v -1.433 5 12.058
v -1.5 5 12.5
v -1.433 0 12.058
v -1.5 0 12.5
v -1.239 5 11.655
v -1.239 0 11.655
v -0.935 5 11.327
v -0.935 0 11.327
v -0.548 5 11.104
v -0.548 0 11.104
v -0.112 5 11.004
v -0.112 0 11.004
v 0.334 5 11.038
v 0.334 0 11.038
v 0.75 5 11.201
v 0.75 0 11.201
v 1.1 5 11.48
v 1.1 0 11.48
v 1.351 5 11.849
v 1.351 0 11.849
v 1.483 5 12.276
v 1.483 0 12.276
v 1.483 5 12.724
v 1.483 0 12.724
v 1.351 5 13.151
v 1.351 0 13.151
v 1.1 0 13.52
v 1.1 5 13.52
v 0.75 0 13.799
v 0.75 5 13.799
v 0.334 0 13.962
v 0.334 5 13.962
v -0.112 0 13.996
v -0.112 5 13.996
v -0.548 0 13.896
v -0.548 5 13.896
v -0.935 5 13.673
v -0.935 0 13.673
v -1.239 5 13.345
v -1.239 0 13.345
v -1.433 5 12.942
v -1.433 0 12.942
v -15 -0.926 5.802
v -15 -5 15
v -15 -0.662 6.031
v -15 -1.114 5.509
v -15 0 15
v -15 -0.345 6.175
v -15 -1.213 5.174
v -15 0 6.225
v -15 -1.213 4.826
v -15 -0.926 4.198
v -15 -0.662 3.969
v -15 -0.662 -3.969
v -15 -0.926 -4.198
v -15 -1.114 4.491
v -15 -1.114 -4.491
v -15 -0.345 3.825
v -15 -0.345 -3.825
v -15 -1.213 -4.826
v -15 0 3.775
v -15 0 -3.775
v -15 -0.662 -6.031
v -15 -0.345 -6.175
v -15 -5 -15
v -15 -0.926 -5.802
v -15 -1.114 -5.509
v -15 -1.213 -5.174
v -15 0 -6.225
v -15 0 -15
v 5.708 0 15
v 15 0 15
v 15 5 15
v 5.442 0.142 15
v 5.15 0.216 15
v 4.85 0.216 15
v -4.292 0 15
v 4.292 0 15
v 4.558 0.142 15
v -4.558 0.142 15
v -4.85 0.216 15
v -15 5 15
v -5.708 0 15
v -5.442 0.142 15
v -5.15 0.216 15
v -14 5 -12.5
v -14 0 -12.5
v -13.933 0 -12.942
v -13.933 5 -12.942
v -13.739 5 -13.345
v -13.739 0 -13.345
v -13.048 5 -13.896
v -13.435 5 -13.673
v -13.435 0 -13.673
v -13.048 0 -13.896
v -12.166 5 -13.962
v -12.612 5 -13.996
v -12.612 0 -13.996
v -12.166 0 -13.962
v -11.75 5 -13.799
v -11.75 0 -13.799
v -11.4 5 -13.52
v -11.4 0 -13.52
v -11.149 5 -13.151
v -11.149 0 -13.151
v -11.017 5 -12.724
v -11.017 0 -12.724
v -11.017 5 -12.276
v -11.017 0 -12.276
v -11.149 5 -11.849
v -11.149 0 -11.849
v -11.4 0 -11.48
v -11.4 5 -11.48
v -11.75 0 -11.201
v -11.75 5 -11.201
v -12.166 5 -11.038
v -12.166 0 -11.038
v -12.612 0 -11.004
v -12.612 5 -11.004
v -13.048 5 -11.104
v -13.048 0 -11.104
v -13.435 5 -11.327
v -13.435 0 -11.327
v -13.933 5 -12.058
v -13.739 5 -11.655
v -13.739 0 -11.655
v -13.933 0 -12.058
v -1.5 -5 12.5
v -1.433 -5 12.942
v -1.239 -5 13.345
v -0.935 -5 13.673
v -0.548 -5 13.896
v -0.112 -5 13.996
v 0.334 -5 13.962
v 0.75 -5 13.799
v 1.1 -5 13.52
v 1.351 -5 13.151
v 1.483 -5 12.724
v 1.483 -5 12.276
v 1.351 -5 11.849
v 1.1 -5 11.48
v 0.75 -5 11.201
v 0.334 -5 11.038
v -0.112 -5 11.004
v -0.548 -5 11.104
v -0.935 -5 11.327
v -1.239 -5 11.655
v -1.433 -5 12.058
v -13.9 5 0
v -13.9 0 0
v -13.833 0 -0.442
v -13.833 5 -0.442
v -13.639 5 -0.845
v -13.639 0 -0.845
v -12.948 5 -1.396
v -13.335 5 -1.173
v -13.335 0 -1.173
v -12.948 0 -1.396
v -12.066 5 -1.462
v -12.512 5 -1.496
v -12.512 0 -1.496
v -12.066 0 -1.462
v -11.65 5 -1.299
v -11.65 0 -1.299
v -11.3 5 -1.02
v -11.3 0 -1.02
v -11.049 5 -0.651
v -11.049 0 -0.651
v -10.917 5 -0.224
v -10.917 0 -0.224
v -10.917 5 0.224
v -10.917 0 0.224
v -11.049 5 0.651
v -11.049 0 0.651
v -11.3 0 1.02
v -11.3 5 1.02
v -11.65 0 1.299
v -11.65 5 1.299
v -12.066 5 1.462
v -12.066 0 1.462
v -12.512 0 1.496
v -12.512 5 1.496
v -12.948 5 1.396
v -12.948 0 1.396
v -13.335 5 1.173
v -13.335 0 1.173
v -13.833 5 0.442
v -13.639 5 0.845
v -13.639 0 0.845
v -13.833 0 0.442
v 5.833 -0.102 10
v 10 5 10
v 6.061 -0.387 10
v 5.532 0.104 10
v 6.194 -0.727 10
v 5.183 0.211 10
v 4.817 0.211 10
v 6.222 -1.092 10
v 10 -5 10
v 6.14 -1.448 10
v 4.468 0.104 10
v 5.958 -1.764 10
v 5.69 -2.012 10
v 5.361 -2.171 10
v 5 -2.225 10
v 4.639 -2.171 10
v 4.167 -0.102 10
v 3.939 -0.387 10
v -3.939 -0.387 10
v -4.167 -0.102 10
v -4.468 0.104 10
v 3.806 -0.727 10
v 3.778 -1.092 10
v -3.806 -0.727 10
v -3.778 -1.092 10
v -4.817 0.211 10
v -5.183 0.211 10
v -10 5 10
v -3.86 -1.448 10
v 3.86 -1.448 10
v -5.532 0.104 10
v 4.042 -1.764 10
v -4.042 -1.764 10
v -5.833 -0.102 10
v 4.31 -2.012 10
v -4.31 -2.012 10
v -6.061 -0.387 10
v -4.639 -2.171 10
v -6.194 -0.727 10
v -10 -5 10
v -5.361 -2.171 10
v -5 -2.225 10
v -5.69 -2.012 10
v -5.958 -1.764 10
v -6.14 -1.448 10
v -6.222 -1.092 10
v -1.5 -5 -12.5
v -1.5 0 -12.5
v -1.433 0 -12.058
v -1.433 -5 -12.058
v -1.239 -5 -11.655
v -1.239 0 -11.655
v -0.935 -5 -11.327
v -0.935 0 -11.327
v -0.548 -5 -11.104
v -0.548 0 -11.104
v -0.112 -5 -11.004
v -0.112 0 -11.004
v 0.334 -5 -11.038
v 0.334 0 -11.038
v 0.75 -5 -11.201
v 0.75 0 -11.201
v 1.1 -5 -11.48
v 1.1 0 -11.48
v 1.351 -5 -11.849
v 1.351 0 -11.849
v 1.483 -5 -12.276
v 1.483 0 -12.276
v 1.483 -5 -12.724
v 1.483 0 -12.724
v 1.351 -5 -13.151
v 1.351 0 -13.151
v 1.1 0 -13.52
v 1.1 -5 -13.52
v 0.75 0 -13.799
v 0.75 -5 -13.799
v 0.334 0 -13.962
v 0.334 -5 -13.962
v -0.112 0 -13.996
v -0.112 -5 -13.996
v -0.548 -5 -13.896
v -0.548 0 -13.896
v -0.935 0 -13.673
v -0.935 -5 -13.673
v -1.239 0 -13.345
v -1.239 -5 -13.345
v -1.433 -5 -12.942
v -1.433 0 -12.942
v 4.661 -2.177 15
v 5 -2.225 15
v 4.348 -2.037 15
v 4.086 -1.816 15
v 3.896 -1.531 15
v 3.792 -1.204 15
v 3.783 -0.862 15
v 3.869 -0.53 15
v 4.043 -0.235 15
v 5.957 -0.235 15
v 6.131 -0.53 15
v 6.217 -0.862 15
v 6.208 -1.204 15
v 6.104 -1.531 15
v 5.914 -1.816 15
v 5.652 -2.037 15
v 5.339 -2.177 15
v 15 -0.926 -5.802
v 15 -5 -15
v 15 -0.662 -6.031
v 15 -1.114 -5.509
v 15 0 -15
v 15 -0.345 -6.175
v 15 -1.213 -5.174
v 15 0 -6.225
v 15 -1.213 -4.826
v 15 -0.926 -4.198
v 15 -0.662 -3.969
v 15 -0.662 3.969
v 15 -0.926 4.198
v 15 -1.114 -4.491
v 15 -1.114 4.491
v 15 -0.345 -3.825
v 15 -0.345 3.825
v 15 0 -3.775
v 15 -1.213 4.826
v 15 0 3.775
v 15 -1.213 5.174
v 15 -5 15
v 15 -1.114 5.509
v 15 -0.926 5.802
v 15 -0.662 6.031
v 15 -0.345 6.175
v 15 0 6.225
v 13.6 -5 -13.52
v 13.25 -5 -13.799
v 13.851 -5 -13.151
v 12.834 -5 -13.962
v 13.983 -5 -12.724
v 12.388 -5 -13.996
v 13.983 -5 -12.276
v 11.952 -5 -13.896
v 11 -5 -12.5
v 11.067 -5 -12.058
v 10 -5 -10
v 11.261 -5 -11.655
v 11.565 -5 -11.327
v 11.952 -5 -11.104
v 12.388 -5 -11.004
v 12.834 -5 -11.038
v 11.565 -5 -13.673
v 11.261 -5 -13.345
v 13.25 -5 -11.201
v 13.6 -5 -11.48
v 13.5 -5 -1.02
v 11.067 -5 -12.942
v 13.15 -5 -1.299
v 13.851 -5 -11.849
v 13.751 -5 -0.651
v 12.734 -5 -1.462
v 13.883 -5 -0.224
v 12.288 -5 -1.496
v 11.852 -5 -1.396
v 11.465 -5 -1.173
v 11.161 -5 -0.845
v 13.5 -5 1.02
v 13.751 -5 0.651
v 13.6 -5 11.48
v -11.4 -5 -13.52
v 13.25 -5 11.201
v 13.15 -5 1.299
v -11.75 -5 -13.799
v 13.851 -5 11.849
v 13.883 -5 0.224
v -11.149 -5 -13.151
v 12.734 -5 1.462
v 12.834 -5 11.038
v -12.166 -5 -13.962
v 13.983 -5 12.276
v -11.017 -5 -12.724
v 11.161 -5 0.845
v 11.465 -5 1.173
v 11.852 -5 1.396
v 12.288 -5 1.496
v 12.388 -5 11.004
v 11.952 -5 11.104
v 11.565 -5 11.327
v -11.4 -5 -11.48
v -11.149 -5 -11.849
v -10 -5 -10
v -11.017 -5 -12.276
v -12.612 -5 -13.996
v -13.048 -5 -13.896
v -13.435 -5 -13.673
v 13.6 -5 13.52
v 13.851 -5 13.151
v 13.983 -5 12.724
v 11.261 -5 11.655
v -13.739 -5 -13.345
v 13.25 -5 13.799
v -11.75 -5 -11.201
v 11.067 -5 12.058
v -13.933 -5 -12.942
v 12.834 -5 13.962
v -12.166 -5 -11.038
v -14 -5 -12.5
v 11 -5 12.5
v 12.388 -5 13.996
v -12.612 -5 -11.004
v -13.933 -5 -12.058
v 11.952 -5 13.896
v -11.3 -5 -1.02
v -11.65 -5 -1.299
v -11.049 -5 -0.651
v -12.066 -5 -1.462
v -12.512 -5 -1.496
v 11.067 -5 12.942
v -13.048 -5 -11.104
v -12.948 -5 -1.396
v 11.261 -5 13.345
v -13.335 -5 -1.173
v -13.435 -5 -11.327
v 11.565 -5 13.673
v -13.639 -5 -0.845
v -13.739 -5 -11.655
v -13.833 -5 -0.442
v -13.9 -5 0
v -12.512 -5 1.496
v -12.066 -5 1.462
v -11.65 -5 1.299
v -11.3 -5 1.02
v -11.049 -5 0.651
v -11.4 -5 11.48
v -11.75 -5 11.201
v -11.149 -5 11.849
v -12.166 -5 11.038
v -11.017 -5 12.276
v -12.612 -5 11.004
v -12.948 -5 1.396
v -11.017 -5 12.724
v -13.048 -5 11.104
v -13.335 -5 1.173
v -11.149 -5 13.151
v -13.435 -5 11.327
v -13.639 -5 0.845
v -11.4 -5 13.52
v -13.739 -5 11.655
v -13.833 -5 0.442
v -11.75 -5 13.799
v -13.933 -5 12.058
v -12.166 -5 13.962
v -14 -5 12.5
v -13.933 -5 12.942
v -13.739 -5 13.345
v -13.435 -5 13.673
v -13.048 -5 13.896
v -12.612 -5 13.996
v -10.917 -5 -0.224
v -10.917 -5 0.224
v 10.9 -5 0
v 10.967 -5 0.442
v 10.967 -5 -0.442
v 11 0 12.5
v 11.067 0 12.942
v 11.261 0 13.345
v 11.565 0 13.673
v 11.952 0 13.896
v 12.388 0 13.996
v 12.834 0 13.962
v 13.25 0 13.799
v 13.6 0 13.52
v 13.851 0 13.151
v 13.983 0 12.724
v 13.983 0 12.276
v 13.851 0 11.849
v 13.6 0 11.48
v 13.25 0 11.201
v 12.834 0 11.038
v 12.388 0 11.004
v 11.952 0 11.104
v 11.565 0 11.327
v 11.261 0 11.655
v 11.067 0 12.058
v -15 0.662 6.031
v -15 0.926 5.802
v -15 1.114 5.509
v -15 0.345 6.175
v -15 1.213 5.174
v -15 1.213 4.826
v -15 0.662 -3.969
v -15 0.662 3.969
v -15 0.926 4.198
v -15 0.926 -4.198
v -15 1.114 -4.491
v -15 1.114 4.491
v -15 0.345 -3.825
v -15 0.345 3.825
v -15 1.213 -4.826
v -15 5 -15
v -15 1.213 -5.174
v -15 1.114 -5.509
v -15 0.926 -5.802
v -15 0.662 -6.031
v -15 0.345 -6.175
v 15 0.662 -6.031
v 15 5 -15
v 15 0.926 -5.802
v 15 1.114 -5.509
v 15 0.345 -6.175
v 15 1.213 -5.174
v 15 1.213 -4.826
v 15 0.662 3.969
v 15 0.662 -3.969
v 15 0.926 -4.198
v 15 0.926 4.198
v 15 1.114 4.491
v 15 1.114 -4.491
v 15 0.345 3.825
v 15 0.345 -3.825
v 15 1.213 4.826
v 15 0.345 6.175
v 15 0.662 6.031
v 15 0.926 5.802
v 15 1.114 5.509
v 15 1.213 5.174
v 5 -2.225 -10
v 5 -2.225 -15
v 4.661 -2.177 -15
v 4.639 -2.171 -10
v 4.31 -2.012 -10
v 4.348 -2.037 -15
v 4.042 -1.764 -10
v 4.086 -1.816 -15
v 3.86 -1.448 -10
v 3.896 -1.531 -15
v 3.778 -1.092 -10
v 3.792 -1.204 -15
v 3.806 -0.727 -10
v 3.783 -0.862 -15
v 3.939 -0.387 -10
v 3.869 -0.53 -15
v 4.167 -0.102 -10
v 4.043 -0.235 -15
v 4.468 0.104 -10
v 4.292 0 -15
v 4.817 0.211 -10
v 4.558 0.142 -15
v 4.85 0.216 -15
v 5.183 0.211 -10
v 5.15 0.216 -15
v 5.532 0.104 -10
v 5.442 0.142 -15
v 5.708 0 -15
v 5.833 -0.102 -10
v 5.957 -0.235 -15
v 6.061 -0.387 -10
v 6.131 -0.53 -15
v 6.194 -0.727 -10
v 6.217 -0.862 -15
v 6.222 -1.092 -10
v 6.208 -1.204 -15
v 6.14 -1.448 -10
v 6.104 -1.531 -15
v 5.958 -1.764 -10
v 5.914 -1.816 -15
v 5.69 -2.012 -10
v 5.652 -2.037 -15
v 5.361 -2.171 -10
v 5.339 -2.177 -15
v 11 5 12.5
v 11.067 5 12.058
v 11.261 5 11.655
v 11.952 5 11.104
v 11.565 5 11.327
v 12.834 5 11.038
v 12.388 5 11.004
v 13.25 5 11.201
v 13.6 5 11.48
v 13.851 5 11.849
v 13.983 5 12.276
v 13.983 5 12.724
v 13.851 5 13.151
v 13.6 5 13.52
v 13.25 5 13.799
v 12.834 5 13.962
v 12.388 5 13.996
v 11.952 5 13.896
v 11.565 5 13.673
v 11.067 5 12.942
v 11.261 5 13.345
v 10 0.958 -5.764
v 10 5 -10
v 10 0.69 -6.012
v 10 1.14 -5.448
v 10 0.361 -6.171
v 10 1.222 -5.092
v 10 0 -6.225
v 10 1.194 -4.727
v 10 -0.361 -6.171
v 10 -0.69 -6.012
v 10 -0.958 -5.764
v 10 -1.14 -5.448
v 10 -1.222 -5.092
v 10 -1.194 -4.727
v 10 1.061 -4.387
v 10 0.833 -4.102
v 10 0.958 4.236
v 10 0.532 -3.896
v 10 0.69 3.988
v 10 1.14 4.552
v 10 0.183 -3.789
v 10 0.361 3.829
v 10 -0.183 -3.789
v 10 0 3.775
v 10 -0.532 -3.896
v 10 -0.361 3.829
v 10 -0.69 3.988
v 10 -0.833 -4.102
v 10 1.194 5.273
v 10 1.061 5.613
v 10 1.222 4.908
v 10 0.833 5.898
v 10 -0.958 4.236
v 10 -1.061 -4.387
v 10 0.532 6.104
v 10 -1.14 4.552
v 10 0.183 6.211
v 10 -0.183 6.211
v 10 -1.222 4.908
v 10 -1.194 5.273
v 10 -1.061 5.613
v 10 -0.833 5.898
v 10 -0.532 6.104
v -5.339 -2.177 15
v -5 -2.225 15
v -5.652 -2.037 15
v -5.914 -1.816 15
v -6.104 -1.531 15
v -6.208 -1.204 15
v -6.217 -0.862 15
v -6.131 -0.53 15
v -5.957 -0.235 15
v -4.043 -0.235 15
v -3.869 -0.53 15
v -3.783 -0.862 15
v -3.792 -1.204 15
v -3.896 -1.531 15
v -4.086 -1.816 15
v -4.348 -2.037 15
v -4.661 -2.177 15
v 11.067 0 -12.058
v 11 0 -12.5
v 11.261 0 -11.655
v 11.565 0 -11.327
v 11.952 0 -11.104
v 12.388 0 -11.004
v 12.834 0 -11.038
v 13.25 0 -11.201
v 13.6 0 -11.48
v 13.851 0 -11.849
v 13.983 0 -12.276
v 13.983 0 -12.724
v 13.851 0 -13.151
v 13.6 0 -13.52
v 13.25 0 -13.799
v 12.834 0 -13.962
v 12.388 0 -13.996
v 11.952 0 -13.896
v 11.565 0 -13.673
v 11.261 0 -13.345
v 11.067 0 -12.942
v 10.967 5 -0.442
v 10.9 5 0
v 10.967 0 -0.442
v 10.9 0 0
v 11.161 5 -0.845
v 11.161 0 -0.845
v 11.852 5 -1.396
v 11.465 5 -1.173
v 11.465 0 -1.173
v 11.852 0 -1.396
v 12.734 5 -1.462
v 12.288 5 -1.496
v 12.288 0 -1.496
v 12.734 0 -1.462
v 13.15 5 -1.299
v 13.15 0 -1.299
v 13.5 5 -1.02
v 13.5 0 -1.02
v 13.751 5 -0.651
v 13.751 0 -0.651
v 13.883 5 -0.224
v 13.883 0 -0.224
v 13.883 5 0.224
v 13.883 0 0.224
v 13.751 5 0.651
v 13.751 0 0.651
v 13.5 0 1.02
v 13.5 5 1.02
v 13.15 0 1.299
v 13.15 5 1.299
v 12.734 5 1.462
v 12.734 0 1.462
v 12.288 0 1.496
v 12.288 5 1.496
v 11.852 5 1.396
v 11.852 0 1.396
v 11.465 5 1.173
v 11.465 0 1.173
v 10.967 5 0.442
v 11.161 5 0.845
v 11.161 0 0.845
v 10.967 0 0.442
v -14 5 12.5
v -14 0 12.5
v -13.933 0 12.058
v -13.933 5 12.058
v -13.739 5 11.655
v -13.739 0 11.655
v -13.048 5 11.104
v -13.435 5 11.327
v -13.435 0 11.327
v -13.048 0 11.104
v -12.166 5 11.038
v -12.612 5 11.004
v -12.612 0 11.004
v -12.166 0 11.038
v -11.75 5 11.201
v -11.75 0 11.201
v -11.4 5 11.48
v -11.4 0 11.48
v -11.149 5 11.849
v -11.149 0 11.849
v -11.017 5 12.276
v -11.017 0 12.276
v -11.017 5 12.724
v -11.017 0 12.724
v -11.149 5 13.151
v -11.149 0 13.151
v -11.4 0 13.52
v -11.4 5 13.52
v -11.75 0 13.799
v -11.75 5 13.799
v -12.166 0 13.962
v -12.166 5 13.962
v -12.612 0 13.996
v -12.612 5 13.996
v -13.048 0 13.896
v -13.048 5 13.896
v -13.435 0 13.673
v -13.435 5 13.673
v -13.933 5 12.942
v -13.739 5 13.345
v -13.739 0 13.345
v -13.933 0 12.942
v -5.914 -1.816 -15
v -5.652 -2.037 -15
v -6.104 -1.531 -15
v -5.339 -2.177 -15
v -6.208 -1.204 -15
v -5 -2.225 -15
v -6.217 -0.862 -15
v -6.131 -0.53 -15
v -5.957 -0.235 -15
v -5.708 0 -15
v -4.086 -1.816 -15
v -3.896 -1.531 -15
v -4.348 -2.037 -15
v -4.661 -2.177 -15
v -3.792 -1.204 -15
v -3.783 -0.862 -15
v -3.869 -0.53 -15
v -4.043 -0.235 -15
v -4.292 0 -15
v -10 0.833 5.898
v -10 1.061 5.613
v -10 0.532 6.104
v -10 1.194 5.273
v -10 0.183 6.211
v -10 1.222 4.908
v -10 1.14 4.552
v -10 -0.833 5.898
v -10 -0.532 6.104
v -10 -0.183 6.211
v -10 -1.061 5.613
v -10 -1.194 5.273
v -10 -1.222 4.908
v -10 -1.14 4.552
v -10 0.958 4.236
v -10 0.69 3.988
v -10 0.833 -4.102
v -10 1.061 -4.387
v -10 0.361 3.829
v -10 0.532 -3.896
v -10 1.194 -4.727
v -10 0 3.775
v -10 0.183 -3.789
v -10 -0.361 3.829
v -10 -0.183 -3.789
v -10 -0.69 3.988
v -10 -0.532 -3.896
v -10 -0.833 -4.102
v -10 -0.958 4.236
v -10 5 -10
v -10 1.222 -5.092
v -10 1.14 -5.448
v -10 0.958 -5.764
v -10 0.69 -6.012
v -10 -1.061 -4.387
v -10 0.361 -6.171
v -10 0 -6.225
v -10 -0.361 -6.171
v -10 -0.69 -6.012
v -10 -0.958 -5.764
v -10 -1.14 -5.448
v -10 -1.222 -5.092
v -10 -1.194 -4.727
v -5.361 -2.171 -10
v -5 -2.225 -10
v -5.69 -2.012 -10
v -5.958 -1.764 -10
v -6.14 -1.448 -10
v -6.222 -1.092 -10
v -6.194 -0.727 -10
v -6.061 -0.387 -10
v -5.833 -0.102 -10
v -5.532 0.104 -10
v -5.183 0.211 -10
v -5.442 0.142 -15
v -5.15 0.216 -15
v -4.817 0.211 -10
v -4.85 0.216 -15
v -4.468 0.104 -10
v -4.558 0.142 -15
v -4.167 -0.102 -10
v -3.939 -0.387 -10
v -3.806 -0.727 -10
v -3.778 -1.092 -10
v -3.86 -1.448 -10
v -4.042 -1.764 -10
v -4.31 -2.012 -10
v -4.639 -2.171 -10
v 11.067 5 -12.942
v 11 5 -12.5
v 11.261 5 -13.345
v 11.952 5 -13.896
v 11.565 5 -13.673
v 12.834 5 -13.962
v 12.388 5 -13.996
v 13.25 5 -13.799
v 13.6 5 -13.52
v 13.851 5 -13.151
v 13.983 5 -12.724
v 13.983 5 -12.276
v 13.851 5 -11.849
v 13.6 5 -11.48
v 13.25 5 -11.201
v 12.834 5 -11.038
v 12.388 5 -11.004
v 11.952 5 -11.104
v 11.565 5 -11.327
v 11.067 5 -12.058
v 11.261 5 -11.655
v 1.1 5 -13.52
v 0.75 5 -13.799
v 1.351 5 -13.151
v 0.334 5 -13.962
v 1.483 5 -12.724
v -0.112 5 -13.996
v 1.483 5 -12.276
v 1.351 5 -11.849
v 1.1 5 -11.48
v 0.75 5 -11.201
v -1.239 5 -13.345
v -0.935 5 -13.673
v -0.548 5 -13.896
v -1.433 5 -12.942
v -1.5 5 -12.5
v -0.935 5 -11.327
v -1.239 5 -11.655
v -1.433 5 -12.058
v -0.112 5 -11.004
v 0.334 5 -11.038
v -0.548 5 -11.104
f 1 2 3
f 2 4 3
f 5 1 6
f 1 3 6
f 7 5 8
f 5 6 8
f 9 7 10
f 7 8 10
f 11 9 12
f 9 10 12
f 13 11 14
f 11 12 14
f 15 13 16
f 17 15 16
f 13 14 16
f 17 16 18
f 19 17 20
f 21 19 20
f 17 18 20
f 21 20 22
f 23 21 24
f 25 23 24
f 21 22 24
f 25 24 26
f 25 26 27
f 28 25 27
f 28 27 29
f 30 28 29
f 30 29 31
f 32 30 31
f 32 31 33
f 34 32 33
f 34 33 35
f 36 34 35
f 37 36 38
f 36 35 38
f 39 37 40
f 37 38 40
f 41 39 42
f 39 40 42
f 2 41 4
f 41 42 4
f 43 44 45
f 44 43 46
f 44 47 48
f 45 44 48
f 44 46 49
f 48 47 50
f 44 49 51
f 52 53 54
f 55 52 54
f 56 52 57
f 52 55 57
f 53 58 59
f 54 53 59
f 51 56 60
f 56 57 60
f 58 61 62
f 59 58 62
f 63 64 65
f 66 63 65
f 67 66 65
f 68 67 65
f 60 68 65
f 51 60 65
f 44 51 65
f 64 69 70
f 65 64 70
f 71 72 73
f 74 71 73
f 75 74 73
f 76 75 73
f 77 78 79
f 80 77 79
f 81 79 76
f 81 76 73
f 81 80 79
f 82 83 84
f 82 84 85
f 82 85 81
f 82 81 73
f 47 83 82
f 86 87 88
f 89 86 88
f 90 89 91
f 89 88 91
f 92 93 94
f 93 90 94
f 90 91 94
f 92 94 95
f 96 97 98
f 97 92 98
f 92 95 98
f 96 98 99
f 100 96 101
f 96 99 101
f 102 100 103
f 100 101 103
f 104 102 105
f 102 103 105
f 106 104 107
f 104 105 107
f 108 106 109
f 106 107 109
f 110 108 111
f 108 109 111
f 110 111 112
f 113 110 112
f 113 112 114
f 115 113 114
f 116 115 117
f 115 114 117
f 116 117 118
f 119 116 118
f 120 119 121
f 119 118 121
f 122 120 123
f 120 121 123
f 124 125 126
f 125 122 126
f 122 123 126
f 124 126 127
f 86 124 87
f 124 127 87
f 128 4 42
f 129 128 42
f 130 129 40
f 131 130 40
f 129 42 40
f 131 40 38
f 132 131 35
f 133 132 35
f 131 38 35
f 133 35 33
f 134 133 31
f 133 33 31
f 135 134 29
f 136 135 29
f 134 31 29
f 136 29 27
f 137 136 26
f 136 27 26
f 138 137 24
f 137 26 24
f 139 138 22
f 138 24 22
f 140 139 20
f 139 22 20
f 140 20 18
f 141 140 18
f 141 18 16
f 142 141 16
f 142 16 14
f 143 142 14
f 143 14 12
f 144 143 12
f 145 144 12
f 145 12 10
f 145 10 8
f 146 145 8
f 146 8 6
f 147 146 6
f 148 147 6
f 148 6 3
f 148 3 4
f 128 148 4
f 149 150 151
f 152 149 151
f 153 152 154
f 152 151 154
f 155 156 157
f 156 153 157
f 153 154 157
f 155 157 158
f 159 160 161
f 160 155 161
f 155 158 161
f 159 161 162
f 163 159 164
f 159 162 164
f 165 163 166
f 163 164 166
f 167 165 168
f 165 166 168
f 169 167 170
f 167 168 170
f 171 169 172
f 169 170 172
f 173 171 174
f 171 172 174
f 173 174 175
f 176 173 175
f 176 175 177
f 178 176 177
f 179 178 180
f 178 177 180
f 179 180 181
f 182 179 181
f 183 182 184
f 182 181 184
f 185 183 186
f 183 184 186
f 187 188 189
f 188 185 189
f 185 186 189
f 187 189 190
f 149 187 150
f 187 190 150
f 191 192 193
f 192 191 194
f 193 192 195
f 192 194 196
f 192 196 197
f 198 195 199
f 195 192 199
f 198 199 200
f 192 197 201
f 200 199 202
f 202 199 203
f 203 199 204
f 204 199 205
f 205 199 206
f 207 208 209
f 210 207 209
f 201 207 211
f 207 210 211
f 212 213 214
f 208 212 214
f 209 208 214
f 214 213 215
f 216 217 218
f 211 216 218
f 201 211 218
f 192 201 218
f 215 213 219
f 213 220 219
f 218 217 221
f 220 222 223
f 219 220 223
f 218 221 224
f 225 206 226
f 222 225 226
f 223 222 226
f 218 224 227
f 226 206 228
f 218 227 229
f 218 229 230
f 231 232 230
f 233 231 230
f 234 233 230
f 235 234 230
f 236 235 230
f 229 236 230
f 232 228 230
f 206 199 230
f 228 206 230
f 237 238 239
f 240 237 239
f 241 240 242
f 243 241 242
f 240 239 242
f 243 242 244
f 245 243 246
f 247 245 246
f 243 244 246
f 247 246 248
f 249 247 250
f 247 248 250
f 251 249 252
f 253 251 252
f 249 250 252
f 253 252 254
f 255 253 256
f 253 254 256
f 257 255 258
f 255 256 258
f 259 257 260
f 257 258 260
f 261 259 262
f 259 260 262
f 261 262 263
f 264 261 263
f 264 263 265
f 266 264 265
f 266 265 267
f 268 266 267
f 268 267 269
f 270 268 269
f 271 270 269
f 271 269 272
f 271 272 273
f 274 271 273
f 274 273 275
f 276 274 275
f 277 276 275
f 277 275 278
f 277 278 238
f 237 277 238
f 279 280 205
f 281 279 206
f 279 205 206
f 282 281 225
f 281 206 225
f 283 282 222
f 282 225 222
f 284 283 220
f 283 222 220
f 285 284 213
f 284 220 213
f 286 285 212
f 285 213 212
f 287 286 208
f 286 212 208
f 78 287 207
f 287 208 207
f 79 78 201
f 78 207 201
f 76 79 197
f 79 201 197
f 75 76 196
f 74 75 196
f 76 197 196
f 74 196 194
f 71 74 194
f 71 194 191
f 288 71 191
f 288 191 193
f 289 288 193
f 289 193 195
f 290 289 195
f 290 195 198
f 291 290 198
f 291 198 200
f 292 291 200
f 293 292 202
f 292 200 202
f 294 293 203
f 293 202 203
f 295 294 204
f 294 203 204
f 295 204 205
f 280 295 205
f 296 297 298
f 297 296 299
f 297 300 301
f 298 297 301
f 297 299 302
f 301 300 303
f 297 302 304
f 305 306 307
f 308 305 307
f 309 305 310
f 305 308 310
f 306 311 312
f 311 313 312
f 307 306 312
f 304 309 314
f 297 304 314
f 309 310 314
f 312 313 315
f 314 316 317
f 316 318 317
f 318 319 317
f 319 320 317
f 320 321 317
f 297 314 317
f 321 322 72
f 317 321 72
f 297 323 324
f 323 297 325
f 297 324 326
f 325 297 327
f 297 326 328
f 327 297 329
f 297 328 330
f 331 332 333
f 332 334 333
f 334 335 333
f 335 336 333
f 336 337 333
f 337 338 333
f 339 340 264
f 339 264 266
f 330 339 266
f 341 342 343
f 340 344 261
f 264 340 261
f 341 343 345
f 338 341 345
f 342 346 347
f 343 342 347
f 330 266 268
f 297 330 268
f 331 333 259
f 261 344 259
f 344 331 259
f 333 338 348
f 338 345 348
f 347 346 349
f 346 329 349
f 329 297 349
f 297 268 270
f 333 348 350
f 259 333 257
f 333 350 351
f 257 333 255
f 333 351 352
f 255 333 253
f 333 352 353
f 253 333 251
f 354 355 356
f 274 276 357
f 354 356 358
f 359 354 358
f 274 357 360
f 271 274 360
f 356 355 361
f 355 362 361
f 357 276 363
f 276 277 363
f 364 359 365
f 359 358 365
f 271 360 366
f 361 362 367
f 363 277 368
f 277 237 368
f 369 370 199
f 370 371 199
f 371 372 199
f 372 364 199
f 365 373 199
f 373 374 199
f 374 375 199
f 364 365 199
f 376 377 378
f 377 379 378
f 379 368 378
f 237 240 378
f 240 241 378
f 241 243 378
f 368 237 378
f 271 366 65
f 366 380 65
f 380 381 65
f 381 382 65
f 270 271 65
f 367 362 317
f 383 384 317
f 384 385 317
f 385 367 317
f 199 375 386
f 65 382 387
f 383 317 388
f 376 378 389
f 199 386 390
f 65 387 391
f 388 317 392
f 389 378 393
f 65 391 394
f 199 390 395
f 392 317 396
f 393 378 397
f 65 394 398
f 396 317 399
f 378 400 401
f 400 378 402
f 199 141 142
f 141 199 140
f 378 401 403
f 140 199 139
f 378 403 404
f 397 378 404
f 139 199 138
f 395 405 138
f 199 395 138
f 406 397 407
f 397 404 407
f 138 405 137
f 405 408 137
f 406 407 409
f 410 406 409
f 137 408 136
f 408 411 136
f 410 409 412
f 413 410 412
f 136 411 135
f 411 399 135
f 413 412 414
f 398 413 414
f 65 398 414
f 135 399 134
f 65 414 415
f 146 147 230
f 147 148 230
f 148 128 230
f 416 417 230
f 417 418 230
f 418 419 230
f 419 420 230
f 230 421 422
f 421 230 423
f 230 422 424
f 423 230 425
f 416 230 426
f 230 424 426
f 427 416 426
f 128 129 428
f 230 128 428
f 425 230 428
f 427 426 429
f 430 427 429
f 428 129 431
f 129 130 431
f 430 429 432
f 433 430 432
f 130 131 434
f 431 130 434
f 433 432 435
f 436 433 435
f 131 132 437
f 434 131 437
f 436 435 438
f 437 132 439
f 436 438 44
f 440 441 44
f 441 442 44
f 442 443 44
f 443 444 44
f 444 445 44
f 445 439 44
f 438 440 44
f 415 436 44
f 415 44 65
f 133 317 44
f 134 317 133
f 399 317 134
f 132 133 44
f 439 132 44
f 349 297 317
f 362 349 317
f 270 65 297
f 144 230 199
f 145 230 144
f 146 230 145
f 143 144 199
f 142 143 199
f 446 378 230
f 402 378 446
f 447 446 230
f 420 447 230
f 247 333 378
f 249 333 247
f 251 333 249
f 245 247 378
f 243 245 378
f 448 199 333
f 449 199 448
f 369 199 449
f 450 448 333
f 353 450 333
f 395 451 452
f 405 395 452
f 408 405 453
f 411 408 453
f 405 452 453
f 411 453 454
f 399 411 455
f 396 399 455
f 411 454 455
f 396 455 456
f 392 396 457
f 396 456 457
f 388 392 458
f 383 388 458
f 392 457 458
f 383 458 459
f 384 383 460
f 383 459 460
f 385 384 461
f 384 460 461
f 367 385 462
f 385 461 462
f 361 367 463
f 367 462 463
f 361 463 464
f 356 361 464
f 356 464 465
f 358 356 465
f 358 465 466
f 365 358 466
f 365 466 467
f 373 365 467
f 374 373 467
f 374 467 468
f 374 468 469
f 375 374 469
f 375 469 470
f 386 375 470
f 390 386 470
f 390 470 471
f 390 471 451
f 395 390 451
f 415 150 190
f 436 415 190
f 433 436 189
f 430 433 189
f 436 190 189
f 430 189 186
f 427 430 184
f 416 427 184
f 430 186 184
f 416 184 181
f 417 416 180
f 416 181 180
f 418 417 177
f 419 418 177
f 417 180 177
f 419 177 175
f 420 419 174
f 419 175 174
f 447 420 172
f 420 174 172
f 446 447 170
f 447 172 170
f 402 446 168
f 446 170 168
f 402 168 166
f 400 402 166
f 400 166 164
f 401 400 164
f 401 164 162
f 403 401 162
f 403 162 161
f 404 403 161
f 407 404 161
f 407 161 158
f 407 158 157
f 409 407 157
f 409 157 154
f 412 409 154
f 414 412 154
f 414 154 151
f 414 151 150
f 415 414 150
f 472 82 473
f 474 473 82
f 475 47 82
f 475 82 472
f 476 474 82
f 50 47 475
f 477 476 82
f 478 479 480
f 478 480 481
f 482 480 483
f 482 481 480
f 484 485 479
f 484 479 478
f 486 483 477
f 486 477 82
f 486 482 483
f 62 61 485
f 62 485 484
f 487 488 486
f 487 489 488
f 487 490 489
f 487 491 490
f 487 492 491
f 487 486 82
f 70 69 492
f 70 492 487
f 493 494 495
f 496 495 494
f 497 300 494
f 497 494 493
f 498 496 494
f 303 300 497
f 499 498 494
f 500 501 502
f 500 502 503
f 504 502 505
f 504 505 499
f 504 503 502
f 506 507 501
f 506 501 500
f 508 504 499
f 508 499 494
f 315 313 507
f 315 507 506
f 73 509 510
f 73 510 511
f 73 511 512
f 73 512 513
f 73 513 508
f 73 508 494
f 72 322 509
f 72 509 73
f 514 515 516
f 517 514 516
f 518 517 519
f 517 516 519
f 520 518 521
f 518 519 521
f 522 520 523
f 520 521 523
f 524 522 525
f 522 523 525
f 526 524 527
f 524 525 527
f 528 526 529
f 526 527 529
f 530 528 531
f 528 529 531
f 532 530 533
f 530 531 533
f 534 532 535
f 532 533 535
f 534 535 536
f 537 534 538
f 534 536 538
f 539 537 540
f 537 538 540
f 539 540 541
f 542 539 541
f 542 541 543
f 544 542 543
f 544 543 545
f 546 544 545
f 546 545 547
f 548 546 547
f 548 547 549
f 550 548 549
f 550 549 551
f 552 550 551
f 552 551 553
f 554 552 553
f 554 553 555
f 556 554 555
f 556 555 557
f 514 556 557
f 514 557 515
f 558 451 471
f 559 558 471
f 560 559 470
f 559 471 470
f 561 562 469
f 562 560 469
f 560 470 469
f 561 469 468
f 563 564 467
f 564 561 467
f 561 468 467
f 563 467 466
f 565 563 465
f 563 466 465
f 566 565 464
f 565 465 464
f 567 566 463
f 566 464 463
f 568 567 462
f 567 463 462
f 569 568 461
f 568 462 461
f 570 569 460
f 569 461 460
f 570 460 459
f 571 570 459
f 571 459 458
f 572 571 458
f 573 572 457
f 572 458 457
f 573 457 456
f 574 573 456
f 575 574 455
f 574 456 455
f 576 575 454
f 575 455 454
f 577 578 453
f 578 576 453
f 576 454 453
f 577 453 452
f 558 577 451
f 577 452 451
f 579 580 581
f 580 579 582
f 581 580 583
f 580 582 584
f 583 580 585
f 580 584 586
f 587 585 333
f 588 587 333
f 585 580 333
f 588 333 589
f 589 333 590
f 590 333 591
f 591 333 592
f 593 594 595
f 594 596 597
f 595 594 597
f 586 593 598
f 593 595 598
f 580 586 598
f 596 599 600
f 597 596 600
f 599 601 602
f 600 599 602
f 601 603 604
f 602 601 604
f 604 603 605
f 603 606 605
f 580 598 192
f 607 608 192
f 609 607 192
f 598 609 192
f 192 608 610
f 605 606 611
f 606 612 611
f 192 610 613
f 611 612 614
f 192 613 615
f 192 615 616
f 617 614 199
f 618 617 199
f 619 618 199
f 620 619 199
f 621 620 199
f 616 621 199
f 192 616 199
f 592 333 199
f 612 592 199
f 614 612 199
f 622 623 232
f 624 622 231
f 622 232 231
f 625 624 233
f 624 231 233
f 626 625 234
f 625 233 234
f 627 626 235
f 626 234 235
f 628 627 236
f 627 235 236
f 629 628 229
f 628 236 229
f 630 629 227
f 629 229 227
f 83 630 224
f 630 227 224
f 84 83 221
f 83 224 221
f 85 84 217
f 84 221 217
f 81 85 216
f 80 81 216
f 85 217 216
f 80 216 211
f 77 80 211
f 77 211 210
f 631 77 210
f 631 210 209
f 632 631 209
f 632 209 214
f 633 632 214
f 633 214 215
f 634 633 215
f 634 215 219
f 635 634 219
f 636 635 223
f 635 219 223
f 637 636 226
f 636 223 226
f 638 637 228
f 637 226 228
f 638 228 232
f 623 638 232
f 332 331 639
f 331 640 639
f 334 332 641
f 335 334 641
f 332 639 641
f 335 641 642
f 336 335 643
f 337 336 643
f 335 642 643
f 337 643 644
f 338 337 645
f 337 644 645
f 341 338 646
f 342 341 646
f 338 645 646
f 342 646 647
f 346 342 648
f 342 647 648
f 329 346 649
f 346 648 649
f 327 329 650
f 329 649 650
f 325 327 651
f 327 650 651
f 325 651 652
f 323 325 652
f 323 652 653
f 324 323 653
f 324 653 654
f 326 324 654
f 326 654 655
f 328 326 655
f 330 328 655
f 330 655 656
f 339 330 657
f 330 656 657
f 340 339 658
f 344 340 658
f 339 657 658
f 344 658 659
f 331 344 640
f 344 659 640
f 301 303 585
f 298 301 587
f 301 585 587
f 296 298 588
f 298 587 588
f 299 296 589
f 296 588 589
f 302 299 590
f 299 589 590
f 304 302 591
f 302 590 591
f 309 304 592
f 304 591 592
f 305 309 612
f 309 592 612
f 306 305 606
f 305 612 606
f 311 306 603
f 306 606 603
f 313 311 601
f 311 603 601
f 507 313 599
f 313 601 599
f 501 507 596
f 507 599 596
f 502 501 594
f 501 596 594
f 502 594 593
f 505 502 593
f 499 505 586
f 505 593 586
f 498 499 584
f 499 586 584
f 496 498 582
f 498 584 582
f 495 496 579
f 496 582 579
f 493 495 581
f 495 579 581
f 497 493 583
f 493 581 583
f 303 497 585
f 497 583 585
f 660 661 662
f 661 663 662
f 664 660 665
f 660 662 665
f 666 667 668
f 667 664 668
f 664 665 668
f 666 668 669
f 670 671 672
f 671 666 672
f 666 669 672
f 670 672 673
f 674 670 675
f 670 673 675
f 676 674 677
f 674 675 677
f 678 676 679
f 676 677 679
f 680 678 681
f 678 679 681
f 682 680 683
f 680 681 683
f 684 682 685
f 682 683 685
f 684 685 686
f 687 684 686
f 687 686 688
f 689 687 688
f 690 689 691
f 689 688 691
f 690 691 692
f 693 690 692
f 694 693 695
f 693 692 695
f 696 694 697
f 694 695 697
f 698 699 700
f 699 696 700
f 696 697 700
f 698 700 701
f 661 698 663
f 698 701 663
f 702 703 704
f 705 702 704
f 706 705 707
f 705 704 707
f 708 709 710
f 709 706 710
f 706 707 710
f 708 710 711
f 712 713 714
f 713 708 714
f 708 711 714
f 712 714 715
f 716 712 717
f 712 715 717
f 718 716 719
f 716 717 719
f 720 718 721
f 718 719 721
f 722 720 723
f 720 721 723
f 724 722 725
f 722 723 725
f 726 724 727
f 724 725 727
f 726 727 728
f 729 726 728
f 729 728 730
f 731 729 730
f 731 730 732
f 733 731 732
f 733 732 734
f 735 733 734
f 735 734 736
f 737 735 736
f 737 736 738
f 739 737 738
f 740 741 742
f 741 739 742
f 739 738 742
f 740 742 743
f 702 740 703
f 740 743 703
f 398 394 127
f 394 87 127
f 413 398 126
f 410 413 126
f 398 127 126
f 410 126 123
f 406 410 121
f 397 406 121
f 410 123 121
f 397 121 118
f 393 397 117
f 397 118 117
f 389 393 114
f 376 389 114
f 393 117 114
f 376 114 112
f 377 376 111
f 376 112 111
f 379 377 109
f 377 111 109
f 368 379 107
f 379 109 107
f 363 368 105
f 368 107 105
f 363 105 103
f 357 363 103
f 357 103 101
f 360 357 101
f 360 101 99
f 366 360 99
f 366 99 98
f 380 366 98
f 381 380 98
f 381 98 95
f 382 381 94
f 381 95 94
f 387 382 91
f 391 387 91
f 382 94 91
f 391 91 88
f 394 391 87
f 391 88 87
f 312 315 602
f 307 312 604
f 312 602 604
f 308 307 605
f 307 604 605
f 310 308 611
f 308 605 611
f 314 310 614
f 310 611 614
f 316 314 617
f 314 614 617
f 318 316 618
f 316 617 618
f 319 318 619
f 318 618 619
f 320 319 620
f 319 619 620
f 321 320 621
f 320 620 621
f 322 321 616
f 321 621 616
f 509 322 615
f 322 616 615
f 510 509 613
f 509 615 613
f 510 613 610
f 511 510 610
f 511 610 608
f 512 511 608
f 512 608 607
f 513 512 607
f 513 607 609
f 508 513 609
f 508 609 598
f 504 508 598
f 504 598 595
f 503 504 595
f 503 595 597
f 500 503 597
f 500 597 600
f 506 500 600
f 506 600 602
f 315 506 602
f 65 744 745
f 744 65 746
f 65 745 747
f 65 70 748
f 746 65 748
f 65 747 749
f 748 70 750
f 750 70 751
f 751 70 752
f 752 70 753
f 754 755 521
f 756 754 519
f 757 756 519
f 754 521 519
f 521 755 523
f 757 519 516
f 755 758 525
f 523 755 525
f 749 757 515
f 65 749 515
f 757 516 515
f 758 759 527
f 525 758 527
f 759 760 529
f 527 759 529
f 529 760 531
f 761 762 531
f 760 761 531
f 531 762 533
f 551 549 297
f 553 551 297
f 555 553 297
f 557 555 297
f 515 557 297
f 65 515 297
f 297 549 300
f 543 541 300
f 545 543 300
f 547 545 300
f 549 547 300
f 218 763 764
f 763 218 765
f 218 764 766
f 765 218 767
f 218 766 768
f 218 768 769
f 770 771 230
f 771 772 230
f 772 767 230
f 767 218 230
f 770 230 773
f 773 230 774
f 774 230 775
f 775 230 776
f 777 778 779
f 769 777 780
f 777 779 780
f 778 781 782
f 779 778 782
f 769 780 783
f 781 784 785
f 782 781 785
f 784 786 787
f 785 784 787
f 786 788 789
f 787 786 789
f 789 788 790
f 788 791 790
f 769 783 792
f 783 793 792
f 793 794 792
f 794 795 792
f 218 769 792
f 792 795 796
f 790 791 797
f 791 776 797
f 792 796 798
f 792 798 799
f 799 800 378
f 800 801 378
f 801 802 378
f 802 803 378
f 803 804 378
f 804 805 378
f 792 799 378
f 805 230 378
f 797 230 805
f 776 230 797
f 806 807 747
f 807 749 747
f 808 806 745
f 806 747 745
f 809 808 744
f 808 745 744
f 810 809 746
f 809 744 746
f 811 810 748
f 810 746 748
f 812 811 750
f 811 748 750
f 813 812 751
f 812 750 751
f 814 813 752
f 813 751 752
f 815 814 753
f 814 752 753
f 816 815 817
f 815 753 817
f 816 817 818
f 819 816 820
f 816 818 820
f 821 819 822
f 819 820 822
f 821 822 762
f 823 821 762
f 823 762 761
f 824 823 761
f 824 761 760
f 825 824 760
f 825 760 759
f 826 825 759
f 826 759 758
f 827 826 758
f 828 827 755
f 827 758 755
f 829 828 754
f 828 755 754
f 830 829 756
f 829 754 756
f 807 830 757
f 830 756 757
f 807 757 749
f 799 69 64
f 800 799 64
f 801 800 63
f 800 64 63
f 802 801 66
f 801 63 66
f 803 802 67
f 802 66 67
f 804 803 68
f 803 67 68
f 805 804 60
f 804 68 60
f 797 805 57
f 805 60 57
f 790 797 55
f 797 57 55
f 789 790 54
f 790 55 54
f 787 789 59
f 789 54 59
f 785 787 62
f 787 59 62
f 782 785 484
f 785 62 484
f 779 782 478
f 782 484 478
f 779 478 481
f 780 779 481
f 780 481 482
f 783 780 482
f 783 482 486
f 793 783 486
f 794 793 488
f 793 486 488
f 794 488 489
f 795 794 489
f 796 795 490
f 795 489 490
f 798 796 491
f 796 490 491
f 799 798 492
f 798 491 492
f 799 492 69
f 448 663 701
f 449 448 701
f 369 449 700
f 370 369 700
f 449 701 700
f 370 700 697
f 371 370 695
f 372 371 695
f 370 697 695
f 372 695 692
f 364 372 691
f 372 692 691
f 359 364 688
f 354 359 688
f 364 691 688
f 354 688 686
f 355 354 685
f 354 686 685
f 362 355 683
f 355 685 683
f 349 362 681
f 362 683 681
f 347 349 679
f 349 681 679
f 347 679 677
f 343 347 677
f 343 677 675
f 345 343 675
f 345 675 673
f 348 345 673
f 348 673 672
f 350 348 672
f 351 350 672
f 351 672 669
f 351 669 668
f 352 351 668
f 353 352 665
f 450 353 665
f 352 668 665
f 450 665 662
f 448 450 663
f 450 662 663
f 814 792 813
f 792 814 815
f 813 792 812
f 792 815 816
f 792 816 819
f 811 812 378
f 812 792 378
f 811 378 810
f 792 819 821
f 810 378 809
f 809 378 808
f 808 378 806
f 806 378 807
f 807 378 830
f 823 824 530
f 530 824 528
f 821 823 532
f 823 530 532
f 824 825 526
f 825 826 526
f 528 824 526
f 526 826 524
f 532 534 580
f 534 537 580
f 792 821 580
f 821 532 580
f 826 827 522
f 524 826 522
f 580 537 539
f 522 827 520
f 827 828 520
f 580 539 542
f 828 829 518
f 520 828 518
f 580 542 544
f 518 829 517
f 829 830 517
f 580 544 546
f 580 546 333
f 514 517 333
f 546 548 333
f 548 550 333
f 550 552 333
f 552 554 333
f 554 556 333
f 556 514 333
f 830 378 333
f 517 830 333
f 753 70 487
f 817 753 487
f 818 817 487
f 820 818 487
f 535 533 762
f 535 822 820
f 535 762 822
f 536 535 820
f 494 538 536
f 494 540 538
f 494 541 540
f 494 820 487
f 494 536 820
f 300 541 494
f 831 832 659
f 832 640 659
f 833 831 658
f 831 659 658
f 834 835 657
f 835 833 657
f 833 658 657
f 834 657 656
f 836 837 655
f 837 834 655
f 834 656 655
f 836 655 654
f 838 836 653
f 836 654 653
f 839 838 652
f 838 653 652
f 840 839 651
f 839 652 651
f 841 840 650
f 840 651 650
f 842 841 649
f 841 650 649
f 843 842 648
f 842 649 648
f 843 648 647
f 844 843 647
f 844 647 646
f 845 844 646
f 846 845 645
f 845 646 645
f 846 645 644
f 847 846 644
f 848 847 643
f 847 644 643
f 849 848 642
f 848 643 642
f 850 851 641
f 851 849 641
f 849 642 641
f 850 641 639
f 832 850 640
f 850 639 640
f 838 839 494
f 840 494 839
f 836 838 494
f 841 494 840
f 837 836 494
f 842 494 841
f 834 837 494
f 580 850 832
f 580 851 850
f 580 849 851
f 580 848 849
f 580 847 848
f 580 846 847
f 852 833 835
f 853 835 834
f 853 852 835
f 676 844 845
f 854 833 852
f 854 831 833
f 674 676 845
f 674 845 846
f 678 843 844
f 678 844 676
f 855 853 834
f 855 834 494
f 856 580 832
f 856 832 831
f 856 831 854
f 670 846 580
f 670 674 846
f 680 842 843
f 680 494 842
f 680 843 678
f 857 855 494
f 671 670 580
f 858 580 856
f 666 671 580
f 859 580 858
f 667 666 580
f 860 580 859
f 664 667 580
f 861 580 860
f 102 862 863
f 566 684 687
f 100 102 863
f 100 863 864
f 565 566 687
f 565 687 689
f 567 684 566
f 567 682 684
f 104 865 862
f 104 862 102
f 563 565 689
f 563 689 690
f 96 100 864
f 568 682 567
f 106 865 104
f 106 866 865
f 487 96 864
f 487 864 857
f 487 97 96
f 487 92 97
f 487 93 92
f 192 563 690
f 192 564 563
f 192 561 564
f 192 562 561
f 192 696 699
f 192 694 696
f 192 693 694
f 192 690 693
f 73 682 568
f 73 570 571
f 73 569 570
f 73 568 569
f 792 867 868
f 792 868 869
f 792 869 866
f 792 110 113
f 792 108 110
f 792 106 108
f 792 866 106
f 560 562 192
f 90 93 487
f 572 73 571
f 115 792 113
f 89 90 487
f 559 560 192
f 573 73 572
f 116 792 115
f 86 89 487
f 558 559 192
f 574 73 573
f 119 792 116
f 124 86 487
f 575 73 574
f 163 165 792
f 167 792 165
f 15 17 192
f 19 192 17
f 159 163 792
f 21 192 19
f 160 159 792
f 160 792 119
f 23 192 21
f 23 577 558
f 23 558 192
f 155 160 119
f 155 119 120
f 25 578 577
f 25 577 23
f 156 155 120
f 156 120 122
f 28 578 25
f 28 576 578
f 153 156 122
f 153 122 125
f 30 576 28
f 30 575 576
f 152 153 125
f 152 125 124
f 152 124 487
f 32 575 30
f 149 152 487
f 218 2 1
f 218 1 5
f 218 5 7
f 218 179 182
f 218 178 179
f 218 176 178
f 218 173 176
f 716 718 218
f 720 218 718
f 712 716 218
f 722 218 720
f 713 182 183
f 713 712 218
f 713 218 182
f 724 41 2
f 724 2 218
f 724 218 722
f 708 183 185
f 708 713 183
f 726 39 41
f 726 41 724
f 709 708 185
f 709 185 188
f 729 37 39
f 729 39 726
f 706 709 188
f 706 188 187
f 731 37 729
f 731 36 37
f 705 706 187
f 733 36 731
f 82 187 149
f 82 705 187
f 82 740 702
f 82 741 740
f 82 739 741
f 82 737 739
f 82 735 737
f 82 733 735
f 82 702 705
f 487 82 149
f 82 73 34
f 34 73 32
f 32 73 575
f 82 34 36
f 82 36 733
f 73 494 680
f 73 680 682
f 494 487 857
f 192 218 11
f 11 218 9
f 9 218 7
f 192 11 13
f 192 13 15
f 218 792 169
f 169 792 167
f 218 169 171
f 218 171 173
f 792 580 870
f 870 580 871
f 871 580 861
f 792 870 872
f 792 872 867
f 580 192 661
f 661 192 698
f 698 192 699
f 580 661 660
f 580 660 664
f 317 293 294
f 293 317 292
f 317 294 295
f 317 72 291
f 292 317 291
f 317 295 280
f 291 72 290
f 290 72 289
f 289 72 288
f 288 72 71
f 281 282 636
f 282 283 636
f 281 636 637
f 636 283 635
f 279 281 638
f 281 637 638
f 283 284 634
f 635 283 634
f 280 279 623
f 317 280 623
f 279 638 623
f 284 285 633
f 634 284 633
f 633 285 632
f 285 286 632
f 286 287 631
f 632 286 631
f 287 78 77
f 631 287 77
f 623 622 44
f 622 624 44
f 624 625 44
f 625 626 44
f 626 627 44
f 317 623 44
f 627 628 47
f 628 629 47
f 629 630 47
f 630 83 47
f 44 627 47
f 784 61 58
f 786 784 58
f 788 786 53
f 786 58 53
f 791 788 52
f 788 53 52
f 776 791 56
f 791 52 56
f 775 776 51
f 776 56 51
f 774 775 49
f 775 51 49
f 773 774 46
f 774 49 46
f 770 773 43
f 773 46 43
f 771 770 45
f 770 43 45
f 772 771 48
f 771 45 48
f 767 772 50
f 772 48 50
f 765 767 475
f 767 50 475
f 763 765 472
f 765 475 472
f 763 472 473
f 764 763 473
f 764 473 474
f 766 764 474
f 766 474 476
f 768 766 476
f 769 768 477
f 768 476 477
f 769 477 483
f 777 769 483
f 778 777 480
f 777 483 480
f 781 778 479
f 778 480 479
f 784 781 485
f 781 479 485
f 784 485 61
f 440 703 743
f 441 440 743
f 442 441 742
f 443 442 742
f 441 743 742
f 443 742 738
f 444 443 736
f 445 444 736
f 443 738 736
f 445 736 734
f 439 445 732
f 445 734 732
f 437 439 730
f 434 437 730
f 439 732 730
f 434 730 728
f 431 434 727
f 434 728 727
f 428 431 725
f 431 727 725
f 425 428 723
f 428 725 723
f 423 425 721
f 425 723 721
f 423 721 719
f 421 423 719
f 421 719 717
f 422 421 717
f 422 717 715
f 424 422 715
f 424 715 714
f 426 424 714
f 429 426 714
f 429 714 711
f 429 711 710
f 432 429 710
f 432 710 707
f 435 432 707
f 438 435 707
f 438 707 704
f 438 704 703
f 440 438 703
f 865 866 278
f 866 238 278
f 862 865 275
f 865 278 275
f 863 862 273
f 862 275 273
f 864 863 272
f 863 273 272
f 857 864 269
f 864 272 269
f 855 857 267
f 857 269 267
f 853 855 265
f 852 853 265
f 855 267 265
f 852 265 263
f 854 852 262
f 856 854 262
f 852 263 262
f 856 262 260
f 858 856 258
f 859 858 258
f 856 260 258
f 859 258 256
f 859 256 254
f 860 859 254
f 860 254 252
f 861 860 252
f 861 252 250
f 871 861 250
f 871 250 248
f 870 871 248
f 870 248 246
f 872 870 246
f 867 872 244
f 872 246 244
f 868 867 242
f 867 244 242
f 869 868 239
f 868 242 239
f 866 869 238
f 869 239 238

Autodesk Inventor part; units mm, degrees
ref_plane "YZ Plane" through (0, 0, 0) normal (1, 0, 0) x (0, 1, 0)
ref_plane "XZ Plane" through (0, 0, 0) normal (0, 1, 0) x (-1, 0, 0)
ref_plane "XY Plane" through (0, 0, 0) normal (0, 0, 1) x (1, 0, 0)
sketch "Sketch1" plane through (0, 0, 0) normal (0, 1, 0) x (-1, 0, 0)
  line L0 (10, -10) -> (-10, -10)
  line L1 (-10, -10) -> (-10, 10)
  line L2 (-10, 10) -> (10, 10)
  line L3 (10, 10) -> (10, -10)
  line L4 (10, -10) -> (-10, 10) construction
  line L5 (-10, -10) -> (10, 10) construction
  line L6 (-15, 15) -> (15, 15)
  line L7 (15, 15) -> (15, -15)
  line L8 (15, -15) -> (-15, -15)
  line L9 (-15, -15) -> (-15, 15)
  line L10 (-15, 15) -> (15, -15) construction
  line L11 (15, 15) -> (-15, -15) construction
  circle A0 centre (12.4, 0) radius 1.5
  circle A1 centre (0, 12.5) radius 1.5
  circle A2 centre (0, -12.5) radius 1.5
  circle A3 centre (12.5, -12.5) radius 1.5
  circle A4 centre (12.5, 12.5) radius 1.5
  line L12 (0, -15) -> (0, 15)
  circle A5 centre (-12.4, 0) radius 1.5
  circle A6 centre (-12.5, -12.5) radius 1.5
  circle A7 centre (-12.5, 12.5) radius 1.5
  point P0 (0, 0)
  point P1 (10, 0)
  dimension "d0" = 20
  dimension "d1" = 20
  dimension "d4" = 30
  dimension "d5" = 30
  dimension "d6" = 3
  dimension "d7" = 3
  dimension "d8" = 3
  dimension "d9" = 12.5
  dimension "d10" = 12.4
  dimension "d11" = 12.5
  dimension "d12" = 3
  dimension "d13" = 3
  dimension "d14" = 12.5
extrude "Extrusion1" add sketch "Sketch1" along normal mid plane 10 contours L3 L2 L12 A1 L6 L7 L8 A2 L0 | L12 A2 L8 L9 L6 A1 L2 L1 L0
sketch "Sketch2" plane through (-15, 5, 15) normal (0, 0, 1) x (1, 0, 0)
  line L0 (30, 0) -> (30, -10) projected
  line L1 (0, 0) -> (30, 0) projected
  line L2 (0, -10) -> (0, 0) projected
  line L3 (30, -10) -> (0, -10) projected
  point P0 (15, -5)
  point P1 (10, -6)
  point P2 (20, -6)
  dimension "d17" = 10
  dimension "d18" = 10
hole "Hole1" at (5, -1, 15) at (-5, -1, 15) direction (0, 0, -1) diameter 2.45 depth 30
sketch "Sketch3" plane through (15, -5, -15) normal (1, 0, 0) x (0, 0, -1)
  line L0 (0, 0) -> (0, 10) projected
  point P0 (-15, 5)
  point P1 (-20, 5)
  point P2 (-10, 5)
  point P3 (0, 5)
  dimension "d26" = 10
  dimension "d27" = 10
hole "Hole2" at (15, 0, -5) at (15, 0, 5) direction (-1, 0, 0) diameter 2.45 depth 30
properties part number "sleeve"
